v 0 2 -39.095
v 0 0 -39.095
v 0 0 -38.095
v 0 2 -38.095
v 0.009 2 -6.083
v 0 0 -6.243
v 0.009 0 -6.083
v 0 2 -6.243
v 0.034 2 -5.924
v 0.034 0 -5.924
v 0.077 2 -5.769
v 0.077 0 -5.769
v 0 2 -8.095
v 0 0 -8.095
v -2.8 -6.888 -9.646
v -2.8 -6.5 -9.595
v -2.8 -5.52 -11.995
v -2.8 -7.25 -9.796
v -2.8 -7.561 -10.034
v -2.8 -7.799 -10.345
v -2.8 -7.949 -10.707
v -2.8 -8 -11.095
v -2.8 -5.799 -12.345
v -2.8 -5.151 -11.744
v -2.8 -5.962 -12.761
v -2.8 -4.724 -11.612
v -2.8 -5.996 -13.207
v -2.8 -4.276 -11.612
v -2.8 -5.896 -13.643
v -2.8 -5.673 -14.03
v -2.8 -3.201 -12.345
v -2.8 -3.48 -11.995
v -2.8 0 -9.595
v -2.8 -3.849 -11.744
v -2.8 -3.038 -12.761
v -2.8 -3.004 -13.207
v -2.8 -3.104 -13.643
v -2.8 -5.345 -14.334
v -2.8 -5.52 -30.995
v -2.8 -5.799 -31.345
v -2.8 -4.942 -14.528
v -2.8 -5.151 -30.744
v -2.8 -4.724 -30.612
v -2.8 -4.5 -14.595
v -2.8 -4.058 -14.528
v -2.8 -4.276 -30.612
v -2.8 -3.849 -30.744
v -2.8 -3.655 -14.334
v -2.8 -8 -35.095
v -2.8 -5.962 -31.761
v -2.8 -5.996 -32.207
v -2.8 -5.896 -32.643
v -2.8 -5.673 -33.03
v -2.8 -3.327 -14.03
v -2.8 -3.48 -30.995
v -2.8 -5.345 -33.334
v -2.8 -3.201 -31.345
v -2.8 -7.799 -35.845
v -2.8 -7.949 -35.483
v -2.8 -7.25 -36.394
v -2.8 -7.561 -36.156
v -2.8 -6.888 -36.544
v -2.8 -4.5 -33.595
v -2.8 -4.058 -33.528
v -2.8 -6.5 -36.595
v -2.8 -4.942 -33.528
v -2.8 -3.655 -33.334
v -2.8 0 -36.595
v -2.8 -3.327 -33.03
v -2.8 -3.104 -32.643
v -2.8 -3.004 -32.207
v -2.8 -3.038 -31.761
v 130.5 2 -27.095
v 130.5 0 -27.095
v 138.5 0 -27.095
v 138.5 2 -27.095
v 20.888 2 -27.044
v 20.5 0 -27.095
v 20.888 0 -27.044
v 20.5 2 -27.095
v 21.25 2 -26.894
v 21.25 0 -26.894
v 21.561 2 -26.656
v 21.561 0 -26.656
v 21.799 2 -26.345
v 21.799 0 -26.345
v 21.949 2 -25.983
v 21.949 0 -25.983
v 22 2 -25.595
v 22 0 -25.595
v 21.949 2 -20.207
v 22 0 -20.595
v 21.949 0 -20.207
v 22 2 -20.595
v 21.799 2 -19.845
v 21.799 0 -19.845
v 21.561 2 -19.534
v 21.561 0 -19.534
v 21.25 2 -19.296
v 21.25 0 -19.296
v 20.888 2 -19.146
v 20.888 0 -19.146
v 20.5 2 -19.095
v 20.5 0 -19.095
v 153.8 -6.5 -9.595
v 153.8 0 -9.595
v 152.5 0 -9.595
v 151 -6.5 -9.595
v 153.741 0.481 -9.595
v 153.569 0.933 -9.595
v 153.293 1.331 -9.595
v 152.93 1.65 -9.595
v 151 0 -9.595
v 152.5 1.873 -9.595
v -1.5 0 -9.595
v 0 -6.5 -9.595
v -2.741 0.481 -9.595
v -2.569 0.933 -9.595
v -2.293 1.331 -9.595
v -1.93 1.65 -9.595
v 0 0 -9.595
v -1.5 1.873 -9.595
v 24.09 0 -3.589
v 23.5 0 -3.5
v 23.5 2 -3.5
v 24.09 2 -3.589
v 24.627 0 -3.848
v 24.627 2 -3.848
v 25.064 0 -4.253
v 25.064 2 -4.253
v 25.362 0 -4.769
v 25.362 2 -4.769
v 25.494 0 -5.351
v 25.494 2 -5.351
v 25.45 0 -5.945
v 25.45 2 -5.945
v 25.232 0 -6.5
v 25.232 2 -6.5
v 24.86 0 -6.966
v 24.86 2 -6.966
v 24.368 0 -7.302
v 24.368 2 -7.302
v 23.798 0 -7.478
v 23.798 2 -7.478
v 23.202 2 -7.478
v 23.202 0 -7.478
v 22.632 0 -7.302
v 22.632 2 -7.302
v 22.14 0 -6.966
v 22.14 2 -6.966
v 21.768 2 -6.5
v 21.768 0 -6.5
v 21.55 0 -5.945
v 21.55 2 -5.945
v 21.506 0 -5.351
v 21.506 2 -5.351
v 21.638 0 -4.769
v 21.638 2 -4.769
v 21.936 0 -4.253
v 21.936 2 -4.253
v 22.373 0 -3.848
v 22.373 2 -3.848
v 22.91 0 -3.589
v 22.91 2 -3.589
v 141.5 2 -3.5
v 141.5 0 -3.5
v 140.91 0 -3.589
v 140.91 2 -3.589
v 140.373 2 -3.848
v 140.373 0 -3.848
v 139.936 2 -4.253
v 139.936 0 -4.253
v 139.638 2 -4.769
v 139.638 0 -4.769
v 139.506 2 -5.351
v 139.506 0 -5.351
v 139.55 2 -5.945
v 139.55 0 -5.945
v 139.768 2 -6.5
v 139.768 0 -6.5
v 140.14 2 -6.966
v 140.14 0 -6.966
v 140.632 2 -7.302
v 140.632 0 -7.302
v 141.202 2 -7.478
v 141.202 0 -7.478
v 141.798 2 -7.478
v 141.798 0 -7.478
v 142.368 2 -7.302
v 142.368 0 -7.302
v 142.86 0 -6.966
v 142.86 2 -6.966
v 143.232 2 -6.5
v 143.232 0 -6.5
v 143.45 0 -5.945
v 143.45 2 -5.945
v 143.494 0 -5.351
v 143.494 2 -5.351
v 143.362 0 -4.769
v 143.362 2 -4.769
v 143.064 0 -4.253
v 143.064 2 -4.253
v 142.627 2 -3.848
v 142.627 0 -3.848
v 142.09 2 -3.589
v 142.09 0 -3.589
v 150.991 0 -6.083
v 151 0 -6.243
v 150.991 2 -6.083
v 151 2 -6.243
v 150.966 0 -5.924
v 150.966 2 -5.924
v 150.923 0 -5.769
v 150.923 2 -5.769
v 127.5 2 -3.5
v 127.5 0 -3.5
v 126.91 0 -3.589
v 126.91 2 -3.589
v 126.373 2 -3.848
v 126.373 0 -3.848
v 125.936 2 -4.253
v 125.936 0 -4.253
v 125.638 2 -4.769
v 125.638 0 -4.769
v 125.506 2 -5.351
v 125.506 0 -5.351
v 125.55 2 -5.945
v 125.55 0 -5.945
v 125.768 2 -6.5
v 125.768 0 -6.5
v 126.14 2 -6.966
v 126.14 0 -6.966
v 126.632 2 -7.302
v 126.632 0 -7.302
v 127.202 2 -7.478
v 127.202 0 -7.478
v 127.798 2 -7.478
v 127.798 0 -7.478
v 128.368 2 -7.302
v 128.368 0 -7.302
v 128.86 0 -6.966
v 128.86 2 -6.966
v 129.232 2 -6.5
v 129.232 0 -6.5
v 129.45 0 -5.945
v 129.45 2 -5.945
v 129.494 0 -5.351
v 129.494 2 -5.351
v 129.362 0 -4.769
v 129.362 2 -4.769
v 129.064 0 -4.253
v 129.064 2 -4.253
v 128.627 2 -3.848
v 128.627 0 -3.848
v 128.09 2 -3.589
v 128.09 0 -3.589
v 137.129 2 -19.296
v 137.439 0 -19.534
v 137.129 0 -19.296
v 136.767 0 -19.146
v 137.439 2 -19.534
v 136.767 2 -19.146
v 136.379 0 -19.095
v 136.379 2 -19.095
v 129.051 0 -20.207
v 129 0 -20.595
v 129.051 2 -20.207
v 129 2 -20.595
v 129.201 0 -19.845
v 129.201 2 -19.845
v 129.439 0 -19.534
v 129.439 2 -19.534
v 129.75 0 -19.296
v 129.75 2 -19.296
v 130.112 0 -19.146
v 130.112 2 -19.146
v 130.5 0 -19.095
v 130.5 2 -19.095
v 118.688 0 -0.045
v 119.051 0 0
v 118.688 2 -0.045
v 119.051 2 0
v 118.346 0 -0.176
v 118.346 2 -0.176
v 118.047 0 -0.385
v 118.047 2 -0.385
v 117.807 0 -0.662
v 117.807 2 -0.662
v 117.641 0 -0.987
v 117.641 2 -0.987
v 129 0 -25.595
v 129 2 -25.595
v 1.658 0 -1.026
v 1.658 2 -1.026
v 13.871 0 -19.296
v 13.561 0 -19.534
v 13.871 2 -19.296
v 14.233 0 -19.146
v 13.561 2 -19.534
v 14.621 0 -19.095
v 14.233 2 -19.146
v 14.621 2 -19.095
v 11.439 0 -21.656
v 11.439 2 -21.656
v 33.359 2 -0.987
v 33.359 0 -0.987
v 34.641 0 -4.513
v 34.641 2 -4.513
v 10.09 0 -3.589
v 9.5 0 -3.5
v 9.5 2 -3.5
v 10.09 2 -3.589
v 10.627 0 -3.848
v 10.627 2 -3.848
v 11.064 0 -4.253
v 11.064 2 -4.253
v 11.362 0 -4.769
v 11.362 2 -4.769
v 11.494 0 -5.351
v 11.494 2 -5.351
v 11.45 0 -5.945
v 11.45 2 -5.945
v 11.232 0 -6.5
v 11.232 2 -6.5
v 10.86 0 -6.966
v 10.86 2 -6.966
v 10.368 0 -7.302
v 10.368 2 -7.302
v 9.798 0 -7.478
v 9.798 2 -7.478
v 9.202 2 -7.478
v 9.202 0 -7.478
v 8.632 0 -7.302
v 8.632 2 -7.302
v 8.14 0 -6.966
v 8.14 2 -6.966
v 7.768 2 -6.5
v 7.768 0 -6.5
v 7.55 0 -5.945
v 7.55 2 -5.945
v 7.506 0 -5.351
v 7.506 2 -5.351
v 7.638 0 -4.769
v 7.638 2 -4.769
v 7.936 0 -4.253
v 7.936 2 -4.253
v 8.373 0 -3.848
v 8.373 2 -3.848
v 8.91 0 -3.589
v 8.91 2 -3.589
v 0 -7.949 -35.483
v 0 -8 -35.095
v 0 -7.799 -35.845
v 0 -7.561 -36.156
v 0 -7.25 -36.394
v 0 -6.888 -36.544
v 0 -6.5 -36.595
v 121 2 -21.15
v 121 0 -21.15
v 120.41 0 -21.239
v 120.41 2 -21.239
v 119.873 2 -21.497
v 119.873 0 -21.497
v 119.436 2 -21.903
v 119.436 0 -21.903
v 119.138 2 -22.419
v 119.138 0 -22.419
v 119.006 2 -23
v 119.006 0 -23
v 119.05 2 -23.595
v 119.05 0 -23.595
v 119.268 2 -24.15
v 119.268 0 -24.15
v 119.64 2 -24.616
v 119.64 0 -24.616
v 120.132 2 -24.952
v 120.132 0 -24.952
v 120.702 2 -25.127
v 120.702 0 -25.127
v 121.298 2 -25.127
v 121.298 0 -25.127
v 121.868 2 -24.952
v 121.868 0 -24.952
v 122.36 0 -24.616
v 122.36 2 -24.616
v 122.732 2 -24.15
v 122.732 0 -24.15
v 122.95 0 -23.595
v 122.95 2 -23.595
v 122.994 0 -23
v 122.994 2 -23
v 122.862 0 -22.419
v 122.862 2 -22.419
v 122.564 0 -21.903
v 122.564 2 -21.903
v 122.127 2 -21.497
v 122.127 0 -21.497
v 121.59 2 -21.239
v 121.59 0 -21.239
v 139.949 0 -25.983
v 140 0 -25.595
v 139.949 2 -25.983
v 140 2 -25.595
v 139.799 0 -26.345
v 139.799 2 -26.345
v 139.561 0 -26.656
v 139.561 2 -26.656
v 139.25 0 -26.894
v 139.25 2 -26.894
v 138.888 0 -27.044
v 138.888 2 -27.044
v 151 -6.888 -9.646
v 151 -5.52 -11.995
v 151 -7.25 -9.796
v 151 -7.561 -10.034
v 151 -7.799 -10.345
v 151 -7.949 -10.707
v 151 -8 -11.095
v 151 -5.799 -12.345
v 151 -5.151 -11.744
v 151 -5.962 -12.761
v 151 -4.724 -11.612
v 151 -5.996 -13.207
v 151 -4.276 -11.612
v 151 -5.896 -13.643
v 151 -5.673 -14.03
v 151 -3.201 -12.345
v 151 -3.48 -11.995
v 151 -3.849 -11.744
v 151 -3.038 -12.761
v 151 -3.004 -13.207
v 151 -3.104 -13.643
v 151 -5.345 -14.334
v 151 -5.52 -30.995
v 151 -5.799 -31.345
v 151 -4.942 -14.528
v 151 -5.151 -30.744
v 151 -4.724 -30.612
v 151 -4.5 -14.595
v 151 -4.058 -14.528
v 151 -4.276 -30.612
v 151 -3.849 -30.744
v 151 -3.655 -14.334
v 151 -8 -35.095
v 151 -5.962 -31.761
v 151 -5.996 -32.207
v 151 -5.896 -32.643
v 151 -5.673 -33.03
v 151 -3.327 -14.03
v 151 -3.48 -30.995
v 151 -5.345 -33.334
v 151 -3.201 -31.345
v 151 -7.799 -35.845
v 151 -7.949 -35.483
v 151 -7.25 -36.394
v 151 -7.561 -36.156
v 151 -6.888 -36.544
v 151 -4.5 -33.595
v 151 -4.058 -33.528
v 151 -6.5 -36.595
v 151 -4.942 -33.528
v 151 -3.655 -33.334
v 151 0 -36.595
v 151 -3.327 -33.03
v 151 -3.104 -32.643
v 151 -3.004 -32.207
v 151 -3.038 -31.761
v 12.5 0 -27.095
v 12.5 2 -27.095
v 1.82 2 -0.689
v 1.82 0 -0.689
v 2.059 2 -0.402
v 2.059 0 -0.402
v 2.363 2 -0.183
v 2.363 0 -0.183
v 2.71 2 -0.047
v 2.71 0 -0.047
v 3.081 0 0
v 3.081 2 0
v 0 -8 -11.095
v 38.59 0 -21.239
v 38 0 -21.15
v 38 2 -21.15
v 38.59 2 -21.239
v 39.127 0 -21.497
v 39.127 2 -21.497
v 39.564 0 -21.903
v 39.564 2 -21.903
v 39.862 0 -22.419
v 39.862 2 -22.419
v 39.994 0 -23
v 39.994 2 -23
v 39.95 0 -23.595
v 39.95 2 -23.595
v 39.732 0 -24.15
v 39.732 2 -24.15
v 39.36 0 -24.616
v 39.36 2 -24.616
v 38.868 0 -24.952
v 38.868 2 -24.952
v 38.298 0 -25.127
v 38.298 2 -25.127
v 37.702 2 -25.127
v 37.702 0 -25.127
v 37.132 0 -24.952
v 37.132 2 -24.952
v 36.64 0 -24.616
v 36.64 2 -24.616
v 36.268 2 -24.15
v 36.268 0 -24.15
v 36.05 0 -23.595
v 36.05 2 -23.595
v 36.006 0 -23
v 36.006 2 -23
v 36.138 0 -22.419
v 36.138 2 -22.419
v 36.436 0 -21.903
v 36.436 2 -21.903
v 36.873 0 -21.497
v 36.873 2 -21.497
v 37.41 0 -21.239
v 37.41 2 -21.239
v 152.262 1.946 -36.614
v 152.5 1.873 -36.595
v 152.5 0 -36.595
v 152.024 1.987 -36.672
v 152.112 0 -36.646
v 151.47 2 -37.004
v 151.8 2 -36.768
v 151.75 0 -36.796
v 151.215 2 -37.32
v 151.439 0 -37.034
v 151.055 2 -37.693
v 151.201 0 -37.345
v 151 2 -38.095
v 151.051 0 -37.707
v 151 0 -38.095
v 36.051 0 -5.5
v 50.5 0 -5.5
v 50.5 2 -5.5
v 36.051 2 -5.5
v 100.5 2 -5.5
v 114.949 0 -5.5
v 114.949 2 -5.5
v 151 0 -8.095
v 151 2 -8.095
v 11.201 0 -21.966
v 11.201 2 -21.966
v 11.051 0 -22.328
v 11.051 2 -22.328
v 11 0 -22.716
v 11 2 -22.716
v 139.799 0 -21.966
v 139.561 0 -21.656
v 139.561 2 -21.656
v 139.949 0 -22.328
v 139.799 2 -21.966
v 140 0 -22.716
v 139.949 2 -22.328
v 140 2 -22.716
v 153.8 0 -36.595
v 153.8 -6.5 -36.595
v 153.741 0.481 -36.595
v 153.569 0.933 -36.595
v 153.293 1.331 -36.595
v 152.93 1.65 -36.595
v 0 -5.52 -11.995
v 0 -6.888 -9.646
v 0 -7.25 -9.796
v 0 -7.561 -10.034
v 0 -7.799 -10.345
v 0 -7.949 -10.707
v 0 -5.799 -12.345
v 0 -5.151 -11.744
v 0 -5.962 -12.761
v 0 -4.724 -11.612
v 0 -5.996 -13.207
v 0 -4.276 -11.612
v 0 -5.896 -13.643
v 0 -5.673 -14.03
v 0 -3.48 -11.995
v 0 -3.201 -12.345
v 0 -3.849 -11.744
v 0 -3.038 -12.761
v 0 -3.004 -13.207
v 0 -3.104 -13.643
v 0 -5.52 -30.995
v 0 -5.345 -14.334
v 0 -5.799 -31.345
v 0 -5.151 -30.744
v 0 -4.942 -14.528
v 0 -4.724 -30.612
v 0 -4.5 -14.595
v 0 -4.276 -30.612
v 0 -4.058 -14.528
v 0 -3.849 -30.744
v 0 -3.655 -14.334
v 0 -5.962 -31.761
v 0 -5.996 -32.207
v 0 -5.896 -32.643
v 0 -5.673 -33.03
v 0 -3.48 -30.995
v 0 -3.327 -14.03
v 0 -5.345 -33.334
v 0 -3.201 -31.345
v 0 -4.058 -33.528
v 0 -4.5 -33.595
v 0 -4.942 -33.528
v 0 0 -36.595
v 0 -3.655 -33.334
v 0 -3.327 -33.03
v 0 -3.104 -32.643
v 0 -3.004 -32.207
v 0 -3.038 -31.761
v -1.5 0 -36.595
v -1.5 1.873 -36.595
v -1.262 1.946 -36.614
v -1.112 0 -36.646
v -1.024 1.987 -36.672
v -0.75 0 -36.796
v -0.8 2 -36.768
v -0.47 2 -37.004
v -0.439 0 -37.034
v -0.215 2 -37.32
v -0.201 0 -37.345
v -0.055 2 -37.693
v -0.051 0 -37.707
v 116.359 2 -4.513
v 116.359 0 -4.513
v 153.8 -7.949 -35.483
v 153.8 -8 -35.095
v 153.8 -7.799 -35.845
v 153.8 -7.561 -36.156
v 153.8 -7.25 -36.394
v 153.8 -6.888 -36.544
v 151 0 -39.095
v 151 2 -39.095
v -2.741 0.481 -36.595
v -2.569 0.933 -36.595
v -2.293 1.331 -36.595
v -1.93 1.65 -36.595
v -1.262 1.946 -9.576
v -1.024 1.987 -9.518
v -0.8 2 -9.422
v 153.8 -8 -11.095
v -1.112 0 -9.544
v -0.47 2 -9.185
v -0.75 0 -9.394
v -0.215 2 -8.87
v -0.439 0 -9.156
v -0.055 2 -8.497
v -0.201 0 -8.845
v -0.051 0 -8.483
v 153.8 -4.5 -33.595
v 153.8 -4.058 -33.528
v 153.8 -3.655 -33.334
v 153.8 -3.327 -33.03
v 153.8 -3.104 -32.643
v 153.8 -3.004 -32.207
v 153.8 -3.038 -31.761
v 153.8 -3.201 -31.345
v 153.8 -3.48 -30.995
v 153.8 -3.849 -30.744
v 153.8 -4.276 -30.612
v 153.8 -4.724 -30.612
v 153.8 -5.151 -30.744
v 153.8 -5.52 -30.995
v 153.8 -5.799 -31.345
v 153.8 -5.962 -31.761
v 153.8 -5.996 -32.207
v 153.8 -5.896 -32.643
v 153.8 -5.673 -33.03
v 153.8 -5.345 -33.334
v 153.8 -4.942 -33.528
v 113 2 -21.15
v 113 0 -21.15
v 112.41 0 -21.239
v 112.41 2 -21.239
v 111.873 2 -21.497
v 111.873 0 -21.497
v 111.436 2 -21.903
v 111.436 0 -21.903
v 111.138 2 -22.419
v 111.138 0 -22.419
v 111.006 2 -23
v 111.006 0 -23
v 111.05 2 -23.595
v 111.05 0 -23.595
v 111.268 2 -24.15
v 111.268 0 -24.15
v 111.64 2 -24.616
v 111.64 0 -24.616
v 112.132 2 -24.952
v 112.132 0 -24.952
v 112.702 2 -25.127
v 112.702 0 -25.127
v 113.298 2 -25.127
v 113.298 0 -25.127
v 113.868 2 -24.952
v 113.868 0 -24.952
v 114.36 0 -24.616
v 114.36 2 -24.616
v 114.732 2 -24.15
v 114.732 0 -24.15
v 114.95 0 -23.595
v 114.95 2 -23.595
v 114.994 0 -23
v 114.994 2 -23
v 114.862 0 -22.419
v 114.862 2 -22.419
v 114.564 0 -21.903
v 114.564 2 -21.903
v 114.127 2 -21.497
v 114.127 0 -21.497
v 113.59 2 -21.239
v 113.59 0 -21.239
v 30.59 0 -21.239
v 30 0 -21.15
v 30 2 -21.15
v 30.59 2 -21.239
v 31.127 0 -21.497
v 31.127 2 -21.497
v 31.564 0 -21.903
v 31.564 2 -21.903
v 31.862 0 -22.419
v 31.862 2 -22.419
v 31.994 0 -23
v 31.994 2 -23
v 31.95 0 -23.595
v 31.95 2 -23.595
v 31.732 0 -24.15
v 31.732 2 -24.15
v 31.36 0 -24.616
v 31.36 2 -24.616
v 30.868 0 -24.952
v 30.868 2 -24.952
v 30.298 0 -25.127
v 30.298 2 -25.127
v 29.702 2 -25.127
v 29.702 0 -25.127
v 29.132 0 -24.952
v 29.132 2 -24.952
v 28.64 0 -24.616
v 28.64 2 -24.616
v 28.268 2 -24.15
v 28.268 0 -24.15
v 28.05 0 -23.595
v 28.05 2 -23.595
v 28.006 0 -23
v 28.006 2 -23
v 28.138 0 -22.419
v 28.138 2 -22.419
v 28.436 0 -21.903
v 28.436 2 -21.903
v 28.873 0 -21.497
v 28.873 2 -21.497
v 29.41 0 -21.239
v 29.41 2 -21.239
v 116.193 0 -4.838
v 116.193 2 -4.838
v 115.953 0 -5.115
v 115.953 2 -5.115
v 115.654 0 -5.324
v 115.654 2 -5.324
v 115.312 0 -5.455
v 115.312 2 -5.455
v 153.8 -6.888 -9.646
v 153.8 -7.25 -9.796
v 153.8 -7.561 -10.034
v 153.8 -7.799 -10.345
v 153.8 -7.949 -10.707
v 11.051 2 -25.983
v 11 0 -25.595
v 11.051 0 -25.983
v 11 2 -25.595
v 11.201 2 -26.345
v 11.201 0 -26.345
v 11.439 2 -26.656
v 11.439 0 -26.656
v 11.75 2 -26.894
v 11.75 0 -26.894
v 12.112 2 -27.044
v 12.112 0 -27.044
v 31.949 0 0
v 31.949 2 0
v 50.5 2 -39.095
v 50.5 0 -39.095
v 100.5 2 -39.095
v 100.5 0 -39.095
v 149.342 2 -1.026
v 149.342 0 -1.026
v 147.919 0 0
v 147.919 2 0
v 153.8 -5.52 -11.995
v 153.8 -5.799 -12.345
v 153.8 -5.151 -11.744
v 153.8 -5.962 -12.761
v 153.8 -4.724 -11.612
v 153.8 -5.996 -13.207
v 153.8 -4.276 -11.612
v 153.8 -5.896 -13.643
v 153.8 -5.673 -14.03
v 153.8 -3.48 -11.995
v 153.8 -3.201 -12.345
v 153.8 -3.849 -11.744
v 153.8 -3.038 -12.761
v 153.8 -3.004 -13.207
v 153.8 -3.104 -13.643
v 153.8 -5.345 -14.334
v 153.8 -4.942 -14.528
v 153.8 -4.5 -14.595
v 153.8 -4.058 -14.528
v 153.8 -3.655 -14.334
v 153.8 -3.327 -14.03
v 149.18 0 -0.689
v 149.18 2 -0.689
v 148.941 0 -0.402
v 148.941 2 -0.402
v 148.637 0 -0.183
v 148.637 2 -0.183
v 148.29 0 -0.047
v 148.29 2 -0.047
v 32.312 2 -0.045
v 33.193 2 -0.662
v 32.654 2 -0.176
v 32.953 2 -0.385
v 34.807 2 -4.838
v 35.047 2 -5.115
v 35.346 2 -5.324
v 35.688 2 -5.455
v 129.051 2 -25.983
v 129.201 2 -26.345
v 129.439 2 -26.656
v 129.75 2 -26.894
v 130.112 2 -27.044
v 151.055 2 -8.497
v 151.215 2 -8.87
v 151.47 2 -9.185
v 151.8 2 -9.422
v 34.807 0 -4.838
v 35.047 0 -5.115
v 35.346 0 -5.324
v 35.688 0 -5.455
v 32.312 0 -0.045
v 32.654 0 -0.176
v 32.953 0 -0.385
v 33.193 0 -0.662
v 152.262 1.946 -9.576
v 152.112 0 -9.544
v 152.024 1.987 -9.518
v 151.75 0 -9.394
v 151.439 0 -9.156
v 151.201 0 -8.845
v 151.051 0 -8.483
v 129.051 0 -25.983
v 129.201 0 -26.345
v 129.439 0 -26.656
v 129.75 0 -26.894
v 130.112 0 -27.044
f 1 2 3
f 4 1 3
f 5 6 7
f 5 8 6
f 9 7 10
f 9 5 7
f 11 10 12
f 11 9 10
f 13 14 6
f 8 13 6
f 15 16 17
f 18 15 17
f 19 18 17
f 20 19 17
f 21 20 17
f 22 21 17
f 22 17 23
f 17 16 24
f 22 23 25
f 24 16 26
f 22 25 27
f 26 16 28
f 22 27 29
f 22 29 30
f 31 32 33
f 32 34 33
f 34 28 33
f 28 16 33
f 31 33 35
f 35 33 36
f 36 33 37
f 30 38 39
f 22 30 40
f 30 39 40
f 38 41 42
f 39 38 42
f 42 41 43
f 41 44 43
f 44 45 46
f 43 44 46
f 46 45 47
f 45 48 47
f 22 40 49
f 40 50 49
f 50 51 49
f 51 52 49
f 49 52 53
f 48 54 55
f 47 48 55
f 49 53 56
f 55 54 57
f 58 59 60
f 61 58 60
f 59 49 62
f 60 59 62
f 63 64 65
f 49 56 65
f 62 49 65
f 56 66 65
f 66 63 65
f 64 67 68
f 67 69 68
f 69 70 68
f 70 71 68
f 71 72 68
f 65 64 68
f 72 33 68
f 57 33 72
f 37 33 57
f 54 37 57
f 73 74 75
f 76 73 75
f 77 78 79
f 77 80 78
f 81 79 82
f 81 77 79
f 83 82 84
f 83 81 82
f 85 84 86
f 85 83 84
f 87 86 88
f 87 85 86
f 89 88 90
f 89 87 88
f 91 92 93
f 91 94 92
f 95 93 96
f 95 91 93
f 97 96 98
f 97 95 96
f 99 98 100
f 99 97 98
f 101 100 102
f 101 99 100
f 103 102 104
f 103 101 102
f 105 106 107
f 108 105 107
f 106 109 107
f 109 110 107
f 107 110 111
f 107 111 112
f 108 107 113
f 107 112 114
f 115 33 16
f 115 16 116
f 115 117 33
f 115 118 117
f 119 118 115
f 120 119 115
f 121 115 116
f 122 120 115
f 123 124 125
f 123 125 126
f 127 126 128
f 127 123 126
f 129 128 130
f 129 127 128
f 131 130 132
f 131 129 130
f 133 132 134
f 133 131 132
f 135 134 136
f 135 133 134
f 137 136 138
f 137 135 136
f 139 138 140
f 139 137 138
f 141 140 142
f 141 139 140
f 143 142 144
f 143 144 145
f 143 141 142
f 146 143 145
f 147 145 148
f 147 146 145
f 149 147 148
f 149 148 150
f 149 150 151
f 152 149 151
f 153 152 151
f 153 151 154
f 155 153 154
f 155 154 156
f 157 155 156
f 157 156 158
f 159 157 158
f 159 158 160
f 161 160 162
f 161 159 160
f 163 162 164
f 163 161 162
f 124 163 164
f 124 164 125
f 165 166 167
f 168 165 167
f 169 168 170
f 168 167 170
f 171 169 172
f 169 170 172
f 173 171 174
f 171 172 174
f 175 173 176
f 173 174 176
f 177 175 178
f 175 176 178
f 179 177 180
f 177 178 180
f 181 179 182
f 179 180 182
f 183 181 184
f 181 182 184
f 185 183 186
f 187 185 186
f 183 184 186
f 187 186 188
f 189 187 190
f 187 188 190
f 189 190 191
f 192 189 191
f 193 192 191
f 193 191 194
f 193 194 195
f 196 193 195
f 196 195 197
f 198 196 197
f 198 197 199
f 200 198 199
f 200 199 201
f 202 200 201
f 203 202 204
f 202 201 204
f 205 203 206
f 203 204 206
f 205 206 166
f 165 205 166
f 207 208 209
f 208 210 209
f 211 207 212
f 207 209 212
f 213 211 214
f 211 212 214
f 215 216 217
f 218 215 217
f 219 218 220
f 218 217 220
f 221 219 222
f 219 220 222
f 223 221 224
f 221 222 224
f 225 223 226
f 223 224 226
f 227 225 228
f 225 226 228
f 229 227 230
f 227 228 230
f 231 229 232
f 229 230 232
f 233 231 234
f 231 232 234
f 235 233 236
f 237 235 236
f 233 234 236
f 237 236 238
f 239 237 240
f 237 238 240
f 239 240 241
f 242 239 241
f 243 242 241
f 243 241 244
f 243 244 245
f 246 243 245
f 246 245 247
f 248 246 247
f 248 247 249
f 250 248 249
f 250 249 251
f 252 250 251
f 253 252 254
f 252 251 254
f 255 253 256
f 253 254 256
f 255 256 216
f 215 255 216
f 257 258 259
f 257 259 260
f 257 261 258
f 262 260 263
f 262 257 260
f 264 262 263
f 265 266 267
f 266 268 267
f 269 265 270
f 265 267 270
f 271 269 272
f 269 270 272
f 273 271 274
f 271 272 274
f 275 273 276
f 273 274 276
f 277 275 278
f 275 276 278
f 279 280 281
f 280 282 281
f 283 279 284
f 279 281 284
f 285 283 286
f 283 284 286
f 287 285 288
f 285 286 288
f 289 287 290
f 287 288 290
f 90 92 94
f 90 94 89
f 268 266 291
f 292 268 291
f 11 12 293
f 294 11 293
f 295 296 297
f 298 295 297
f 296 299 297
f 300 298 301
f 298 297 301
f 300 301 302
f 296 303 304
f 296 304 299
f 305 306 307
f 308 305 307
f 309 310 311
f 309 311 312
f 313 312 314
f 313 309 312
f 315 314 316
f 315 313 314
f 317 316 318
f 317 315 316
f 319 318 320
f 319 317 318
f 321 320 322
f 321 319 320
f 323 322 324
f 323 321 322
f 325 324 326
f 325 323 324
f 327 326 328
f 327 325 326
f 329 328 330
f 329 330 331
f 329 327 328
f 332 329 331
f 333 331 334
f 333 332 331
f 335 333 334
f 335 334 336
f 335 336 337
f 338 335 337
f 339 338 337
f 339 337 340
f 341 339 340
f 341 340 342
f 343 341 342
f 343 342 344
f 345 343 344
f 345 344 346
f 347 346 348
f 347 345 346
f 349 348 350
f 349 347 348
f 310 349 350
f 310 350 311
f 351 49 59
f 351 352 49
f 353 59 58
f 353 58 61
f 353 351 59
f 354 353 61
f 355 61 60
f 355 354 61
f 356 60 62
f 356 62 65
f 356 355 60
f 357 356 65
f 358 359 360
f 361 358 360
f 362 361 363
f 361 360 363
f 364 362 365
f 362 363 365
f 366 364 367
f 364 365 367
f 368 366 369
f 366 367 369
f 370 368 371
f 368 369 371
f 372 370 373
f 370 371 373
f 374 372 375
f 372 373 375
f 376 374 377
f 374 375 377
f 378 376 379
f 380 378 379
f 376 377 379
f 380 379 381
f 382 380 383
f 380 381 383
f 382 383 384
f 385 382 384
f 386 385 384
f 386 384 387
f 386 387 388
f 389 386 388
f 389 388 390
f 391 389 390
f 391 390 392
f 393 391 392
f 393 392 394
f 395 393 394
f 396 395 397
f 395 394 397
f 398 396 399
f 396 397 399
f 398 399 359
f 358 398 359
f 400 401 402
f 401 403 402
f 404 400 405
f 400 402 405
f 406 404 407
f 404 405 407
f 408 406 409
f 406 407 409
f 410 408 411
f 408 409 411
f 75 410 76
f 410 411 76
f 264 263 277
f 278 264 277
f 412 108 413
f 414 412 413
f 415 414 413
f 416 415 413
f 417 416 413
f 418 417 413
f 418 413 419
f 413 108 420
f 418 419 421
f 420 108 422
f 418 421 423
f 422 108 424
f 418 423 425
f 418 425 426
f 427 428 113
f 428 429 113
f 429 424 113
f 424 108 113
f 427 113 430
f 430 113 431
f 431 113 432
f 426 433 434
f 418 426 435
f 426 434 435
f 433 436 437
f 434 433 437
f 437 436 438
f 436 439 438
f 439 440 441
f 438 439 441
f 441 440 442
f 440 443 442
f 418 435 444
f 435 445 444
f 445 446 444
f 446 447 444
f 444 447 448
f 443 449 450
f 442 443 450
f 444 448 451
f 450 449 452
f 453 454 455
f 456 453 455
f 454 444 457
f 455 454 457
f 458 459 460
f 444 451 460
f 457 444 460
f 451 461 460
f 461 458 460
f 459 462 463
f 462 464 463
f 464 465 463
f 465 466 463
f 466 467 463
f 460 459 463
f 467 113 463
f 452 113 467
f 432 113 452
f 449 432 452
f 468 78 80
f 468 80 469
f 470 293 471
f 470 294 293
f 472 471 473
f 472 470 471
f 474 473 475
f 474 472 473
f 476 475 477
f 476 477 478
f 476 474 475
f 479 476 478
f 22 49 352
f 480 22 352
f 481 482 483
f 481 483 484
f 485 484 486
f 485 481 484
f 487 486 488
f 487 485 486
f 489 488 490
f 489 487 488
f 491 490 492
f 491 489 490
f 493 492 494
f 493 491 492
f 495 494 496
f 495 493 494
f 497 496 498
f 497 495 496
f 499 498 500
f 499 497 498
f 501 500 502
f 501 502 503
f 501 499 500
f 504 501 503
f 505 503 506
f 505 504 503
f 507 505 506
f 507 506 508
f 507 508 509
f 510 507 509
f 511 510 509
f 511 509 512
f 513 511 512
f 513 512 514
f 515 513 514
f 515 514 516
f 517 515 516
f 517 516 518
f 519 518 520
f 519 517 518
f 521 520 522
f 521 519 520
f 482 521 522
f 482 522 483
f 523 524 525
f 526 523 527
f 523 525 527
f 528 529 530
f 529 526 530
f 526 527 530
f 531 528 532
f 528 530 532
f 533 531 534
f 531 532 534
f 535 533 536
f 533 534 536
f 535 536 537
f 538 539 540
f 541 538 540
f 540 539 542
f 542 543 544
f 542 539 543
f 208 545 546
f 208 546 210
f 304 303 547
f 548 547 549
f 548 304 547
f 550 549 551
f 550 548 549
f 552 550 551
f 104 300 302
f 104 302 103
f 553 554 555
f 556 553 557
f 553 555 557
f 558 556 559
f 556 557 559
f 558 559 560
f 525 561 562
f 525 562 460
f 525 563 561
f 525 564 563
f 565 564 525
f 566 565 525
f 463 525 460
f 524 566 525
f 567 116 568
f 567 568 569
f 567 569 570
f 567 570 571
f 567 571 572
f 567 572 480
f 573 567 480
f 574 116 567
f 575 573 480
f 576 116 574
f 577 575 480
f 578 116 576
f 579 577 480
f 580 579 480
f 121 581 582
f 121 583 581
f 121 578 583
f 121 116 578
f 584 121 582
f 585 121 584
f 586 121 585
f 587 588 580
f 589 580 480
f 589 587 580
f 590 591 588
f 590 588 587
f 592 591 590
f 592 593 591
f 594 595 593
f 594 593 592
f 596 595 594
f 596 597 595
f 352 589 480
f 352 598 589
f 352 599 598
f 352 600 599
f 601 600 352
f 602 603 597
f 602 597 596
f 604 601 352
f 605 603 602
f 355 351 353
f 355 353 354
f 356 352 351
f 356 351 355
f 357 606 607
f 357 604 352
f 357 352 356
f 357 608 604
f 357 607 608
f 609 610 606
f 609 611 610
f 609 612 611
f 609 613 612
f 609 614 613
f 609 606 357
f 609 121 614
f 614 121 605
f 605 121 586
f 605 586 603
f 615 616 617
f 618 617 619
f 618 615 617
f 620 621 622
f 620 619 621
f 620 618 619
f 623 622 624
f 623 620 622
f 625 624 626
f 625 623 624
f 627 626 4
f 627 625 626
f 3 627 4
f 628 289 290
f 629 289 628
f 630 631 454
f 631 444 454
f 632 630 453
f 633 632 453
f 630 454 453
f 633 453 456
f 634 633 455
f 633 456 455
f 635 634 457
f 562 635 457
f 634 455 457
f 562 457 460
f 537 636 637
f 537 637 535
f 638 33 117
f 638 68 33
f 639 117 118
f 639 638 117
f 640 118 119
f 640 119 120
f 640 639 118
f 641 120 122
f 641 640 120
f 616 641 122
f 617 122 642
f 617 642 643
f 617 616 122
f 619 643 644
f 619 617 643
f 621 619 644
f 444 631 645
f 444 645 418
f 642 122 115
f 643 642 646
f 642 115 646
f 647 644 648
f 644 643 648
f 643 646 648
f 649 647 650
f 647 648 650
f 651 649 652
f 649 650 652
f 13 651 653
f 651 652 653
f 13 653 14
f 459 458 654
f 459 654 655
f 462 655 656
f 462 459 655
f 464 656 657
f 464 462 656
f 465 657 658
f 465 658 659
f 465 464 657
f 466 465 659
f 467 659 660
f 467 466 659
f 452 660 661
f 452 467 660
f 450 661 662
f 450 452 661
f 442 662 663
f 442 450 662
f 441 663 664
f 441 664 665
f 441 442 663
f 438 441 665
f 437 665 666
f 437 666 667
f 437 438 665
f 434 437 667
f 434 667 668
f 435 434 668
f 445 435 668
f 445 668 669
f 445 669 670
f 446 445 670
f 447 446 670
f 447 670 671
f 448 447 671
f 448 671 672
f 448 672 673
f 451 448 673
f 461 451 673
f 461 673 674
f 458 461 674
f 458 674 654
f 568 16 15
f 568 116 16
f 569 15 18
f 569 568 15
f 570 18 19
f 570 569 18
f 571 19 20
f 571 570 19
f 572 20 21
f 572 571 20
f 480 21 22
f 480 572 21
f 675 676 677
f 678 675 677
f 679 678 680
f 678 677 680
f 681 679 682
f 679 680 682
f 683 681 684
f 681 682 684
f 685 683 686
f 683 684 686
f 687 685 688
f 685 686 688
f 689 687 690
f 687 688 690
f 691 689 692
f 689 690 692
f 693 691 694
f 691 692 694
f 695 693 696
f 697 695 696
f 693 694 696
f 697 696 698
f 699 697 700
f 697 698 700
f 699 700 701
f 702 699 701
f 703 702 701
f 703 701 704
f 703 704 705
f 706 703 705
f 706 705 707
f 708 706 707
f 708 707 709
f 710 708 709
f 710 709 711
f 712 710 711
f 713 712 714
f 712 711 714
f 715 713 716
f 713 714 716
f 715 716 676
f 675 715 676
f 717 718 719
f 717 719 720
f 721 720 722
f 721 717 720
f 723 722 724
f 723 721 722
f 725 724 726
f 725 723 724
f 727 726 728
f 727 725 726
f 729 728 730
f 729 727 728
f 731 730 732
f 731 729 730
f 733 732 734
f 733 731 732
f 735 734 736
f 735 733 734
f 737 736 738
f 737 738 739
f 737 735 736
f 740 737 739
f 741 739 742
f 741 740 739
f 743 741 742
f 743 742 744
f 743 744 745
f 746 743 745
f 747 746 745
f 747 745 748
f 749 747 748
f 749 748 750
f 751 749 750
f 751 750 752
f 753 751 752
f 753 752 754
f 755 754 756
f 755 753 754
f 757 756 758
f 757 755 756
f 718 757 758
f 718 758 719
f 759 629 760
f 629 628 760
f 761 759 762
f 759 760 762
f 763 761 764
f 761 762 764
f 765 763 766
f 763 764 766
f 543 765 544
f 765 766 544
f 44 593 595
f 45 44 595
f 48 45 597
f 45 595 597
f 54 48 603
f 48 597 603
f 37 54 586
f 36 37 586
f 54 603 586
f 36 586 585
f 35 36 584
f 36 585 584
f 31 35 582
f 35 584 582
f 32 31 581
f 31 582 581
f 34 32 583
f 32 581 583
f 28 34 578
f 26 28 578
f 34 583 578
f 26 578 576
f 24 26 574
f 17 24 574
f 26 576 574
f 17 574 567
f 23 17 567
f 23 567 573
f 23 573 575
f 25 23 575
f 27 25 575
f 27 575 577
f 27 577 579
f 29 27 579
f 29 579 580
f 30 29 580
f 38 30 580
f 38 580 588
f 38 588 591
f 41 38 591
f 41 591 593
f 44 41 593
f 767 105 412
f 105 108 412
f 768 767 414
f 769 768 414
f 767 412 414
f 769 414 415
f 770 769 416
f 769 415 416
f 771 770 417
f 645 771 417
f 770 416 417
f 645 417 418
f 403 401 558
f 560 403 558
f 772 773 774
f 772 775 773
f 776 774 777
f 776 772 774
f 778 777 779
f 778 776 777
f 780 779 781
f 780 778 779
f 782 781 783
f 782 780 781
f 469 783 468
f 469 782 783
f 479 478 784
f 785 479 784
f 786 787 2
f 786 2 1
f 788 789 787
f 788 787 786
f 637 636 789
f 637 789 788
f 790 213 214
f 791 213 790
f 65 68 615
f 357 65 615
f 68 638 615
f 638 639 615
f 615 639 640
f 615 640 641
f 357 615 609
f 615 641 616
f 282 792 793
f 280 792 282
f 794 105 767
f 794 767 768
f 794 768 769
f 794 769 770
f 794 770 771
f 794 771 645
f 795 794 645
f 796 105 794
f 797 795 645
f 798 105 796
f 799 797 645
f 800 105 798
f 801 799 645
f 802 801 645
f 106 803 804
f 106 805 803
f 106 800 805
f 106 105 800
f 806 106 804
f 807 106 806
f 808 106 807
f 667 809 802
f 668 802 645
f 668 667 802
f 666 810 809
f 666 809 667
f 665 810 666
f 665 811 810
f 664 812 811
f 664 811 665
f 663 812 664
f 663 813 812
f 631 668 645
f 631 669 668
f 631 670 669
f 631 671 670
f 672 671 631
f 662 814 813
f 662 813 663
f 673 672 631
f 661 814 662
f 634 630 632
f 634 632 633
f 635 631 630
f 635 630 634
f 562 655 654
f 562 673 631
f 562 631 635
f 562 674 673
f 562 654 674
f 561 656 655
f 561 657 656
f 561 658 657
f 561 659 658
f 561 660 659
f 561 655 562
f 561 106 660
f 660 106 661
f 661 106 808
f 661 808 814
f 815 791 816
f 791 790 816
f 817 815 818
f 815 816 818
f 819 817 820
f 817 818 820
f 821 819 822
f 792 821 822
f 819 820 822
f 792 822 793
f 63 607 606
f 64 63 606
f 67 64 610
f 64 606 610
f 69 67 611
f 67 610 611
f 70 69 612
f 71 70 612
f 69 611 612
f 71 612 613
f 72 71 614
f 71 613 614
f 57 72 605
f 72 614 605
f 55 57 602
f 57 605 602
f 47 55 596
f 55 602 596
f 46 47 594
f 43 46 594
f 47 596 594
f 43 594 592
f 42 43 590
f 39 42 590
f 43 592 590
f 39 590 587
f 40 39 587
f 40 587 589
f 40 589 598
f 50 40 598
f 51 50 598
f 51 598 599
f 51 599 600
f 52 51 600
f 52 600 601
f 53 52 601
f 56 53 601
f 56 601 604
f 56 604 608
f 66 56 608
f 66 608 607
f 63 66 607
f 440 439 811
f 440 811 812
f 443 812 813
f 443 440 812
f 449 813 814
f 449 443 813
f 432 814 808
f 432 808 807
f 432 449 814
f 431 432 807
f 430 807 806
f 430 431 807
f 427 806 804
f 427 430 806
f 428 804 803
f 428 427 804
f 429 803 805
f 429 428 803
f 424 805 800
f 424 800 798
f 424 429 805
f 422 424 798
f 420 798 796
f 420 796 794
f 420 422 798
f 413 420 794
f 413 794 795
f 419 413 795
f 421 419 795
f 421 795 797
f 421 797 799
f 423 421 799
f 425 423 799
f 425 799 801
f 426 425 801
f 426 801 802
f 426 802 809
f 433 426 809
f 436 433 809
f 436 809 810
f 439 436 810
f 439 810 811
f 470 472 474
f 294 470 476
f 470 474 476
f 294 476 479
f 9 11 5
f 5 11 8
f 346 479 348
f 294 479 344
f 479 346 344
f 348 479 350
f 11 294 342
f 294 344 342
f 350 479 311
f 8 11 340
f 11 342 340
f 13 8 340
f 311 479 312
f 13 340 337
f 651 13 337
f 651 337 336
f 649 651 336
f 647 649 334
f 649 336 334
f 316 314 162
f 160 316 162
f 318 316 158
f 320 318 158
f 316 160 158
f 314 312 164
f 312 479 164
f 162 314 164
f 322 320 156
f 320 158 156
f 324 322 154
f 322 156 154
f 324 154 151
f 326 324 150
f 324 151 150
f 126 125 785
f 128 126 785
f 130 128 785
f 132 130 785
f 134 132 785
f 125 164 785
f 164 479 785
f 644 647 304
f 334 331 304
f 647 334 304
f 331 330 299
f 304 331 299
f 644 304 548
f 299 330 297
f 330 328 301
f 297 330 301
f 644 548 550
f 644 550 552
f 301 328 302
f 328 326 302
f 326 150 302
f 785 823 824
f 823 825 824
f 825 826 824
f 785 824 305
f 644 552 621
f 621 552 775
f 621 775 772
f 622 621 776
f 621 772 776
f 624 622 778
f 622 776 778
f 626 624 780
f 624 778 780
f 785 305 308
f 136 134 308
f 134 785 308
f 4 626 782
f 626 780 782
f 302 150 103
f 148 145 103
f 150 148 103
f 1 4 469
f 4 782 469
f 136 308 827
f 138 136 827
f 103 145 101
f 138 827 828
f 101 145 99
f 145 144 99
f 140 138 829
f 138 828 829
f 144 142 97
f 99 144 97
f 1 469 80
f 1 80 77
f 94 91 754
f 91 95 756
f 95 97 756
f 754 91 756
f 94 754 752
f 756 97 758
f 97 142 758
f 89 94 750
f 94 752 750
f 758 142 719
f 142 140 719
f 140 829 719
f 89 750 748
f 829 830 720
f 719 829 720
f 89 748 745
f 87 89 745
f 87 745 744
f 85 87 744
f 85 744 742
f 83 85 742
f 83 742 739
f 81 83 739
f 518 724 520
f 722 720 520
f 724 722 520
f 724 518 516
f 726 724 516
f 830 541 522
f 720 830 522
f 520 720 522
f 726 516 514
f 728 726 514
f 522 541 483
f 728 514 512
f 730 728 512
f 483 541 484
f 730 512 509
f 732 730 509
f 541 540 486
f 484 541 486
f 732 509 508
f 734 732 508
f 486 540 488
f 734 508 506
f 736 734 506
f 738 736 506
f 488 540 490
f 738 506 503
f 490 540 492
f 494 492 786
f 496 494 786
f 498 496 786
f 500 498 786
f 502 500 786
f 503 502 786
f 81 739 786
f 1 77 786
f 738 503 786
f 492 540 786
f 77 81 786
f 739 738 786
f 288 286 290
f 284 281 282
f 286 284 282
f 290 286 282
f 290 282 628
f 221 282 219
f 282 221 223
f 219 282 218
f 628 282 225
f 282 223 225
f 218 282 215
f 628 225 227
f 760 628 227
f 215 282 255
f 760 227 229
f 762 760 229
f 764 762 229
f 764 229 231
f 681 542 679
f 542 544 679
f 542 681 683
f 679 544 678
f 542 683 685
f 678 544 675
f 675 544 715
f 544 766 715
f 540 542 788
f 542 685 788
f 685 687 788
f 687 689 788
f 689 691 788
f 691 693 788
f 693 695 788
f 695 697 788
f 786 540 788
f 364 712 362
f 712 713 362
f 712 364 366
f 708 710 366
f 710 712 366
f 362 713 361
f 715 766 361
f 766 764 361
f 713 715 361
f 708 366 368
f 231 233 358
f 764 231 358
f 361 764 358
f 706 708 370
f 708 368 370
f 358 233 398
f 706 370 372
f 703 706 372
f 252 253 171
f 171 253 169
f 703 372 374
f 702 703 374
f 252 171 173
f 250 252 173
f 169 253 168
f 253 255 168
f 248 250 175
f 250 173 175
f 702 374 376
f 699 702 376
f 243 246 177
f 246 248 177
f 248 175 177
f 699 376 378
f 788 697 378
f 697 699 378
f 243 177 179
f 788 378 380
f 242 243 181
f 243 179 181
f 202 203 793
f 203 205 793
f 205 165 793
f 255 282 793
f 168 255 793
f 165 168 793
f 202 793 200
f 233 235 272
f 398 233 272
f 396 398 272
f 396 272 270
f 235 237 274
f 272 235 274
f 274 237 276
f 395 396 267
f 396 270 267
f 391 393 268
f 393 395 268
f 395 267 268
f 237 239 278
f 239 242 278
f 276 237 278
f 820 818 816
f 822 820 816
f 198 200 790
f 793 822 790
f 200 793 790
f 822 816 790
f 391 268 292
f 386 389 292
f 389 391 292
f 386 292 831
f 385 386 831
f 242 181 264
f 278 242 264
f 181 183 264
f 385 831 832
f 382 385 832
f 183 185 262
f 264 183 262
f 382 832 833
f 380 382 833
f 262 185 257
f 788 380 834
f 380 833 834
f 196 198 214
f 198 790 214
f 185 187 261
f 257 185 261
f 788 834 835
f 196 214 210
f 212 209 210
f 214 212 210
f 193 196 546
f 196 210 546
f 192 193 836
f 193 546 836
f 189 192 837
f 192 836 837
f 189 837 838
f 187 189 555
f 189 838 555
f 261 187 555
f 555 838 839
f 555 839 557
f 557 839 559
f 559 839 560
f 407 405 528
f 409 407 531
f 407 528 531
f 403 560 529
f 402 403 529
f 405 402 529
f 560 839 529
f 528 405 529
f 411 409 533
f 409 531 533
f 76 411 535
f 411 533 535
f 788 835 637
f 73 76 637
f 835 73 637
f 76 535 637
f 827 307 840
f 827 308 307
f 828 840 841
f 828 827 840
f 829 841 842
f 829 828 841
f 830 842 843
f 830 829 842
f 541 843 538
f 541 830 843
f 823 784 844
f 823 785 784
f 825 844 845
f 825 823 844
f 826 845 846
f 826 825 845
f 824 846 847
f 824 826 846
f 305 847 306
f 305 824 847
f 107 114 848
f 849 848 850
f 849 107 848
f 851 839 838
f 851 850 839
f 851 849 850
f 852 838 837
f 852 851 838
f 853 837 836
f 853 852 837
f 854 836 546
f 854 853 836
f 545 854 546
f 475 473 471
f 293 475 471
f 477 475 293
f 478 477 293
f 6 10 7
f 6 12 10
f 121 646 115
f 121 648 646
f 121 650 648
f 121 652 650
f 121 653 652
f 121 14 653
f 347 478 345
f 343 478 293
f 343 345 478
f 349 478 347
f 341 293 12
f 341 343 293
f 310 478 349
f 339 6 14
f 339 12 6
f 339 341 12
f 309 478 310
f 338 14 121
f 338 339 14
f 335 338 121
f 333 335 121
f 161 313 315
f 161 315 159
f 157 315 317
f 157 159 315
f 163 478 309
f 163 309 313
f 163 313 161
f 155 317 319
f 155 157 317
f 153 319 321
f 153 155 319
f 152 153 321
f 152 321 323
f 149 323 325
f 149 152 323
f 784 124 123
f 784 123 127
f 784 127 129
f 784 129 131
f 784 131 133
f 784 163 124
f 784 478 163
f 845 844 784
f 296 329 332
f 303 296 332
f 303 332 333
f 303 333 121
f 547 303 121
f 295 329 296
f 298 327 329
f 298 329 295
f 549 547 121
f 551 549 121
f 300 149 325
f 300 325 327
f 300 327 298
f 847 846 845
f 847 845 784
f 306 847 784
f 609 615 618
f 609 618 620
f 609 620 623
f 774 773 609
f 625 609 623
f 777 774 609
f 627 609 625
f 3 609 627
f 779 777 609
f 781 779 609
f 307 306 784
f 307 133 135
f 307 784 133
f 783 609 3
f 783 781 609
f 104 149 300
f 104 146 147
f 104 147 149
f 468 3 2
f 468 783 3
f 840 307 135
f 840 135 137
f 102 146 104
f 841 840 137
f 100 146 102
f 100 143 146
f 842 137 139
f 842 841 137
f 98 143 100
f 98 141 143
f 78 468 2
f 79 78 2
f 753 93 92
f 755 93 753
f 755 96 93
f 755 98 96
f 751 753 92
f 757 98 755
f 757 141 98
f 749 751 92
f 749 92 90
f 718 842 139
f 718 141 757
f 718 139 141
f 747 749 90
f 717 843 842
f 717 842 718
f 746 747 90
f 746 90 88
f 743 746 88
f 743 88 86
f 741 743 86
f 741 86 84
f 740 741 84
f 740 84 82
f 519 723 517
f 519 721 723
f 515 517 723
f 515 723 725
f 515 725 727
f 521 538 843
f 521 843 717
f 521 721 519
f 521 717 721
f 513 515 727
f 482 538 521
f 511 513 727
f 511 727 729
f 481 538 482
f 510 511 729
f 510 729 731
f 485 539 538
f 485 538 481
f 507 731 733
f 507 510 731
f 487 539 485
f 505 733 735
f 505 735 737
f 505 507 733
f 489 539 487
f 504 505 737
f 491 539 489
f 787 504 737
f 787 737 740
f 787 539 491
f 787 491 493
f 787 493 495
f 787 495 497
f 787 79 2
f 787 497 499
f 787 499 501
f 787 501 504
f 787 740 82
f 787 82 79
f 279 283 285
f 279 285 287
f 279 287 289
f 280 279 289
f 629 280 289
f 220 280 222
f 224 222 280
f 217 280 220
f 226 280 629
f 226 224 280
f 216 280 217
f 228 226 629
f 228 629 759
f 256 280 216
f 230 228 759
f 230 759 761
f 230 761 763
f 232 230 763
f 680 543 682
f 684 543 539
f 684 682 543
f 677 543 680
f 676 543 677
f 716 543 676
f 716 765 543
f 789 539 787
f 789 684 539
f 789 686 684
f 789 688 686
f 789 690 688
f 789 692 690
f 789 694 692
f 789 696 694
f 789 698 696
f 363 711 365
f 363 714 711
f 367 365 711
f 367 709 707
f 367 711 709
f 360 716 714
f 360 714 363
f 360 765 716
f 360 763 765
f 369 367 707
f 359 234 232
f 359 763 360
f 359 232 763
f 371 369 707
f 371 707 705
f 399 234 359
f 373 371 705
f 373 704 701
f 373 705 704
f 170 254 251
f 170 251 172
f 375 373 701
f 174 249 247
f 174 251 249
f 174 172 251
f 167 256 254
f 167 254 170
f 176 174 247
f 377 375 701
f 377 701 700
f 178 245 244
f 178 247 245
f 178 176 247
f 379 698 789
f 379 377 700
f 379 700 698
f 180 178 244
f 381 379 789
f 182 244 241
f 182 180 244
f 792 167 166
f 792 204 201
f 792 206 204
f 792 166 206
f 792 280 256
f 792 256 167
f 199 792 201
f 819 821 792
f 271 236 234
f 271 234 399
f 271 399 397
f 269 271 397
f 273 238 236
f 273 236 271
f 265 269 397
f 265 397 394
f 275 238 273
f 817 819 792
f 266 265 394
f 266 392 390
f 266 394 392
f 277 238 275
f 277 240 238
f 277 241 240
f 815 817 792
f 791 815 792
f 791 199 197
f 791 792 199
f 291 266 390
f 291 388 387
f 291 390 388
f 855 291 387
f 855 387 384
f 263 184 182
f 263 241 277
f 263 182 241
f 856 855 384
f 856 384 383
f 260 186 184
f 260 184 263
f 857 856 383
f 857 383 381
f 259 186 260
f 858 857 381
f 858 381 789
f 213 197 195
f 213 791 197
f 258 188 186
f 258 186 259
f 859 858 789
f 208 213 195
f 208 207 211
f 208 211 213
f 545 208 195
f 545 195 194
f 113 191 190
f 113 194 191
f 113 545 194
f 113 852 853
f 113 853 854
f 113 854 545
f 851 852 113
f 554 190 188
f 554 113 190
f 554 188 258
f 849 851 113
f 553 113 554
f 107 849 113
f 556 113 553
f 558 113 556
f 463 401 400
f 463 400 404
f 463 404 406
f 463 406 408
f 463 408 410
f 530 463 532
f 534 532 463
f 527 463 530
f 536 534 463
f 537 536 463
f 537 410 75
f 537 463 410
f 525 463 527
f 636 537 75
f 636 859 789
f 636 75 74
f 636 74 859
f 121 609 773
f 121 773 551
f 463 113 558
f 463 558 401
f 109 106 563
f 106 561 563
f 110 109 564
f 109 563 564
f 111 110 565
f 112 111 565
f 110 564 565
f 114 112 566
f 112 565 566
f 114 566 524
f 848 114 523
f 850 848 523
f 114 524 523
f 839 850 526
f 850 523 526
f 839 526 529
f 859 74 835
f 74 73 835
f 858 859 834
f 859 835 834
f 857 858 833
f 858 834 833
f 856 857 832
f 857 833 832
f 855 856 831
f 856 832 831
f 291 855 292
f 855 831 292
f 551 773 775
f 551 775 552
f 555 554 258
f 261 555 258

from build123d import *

# Parameters (mm, degrees)
SKETCH1_R           = 2
BOSS_EXTRUDE1_DEPTH = 2
SKETCH2_W           = 2.8
SKETCH2_H           = 27
BOSS_EXTRUDE2_DEPTH = 10
SKETCH3_R           = 1.5
CUT_EXTRUDE1_DEPTH  = 114.824325613
FILLET1_R           = 1.5
FILLET2_R           = 2
SKETCH4_W           = 118.780737261
SKETCH4_H           = 53.902552227
CUT_EXTRUDE2_DEPTH  = 171
SKETCH5_W           = 33.594975397
SKETCH5_H           = 2
BOSS_EXTRUDE3_DEPTH = 25


with BuildPart() as part:
    # Sketch1 → Boss-Extrude1 (new body)
    with BuildSketch(Plane(origin=(0, 0, 0), x_dir=(1, 0, 0), z_dir=(0, 1, 0))):
        Polygon((0, 6), (2, 0), (33, 0), (35, 5.5), (66, 5.5), (68, 0), (99, 0), (101, 6), (101, 39.094975397), (0, 39.094975397), align=None)
        with Locations(Location((9.5, 5.5, 0), (0, 0, 270))):
            Circle(SKETCH1_R, mode=Mode.SUBTRACT)
        with Locations(Location((23.5, 5.5, 0), (0, 0, 270))):
            Circle(SKETCH1_R, mode=Mode.SUBTRACT)
        with Locations(Location((77.5, 5.5, 0), (0, 0, 90))):
            Circle(SKETCH1_R, mode=Mode.SUBTRACT)
        with Locations(Location((91.5, 5.5, 0), (0, 0, 90))):
            Circle(SKETCH1_R, mode=Mode.SUBTRACT)
        with Locations(Location((30, 23.149785568, 0), (0, 0, 270))):
            Circle(SKETCH1_R, mode=Mode.SUBTRACT)
        with Locations(Location((38, 23.149785568, 0), (0, 0, 270))):
            Circle(SKETCH1_R, mode=Mode.SUBTRACT)
        with Locations(Location((63, 23.149785568, 0), (0, 0, 90))):
            Circle(SKETCH1_R, mode=Mode.SUBTRACT)
        with Locations(Location((71, 23.149785568, 0), (0, 0, 90))):
            Circle(SKETCH1_R, mode=Mode.SUBTRACT)
        Polygon((11, 22.094975397), (14, 19.094975397), (22, 19.094975397), (22, 27.094975397), (11, 27.094975397), align=None, mode=Mode.SUBTRACT)
        Polygon((90, 27.094975397), (90, 22.094975397), (87, 19.094975397), (79, 19.094975397), (79, 27.094975397), align=None, mode=Mode.SUBTRACT)
    extrude(amount=BOSS_EXTRUDE1_DEPTH)

    # Sketch2 → Boss-Extrude2 (add)
    with BuildSketch(Plane(origin=(0, 2, 0), x_dir=(1, 0, 0), z_dir=(0, 1, 0))):
        with Locations((-1.4, 23.094975397)):
            Rectangle(SKETCH2_W, SKETCH2_H)
        with Locations((102.4, 23.094975397)):
            Rectangle(SKETCH2_W, SKETCH2_H)
    extrude(amount=-BOSS_EXTRUDE2_DEPTH)

    # Sketch3 → Cut-Extrude1 (cut, through all)
    with BuildSketch(Plane(origin=(103.8, 0, 0), x_dir=(0, 0, -1), z_dir=(1, 0, 0))):
        with Locations((13.094975397, -4.5)):
            Circle(SKETCH3_R)
        with Locations((32.094975397, -4.5)):
            Circle(SKETCH3_R)
    extrude(amount=-CUT_EXTRUDE1_DEPTH, mode=Mode.SUBTRACT)

    # Fillet1
    fillet1_edges = [part.edges().sort_by_distance(p)[0] for p in [
        (-1.4, -8, -9.594975397),
        (-1.4, -8, -36.594975397),
        (0, 1, -9.594975397),
        (0, 1, -6),
        (2, 1, 0),
        (0, 1, -36.594975397),
        (102.4, -8, -36.594975397),
        (101, 1, -36.594975397),
        (102.4, -8, -9.594975397),
        (101, 1, -9.594975397),
        (101, 1, -6),
        (99, 1, 0),
        (66, 1, -5.5),
        (68, 1, 0),
        (90, 1, -27.094975397),
        (79, 1, -27.094975397),
        (90, 1, -22.094975397),
        (87, 1, -19.094975397),
        (79, 1, -19.094975397),
        (35, 1, -5.5),
        (33, 1, 0),
        (11, 1, -27.094975397),
        (11, 1, -22.094975397),
        (14, 1, -19.094975397),
        (22, 1, -19.094975397),
        (22, 1, -27.094975397),
    ]]
    fillet(fillet1_edges, radius=FILLET1_R)

    # Fillet2
    fillet2_edges = [part.edges().sort_by_distance(p)[0] for p in [
        (-2.8, 2, -23.094975397),
        (103.8, 2, -23.094975397),
    ]]
    fillet(fillet2_edges, radius=FILLET2_R)

    # Sketch4 → Cut-Extrude2 (cut)
    with BuildSketch(Plane(origin=(50.5, 0, 0), x_dir=(0, 0, -1), z_dir=(1, 0, 0))):
        with Locations((-7.200535956, 8.280511496)):
            Rectangle(SKETCH4_W, SKETCH4_H)
    extrude(amount=CUT_EXTRUDE2_DEPTH, mode=Mode.SUBTRACT)

    # Sketch5 → Boss-Extrude3 (add)
    with BuildSketch(Plane(origin=(50.5, 0, 0), x_dir=(0, 0, -1), z_dir=(1, 0, 0))):
        with Locations((22.297487698, 1)):
            Rectangle(SKETCH5_W, SKETCH5_H)
    extrude(amount=BOSS_EXTRUDE3_DEPTH)

    # Mirror1: part across plane


with BuildPart() as part_1:
    add(part.part)
    add(part.part.mirror(Plane(origin=(75.5, 0, 0), x_dir=(0, 0, 1), z_dir=(1, 0, 0))))


solid = part_1.part
